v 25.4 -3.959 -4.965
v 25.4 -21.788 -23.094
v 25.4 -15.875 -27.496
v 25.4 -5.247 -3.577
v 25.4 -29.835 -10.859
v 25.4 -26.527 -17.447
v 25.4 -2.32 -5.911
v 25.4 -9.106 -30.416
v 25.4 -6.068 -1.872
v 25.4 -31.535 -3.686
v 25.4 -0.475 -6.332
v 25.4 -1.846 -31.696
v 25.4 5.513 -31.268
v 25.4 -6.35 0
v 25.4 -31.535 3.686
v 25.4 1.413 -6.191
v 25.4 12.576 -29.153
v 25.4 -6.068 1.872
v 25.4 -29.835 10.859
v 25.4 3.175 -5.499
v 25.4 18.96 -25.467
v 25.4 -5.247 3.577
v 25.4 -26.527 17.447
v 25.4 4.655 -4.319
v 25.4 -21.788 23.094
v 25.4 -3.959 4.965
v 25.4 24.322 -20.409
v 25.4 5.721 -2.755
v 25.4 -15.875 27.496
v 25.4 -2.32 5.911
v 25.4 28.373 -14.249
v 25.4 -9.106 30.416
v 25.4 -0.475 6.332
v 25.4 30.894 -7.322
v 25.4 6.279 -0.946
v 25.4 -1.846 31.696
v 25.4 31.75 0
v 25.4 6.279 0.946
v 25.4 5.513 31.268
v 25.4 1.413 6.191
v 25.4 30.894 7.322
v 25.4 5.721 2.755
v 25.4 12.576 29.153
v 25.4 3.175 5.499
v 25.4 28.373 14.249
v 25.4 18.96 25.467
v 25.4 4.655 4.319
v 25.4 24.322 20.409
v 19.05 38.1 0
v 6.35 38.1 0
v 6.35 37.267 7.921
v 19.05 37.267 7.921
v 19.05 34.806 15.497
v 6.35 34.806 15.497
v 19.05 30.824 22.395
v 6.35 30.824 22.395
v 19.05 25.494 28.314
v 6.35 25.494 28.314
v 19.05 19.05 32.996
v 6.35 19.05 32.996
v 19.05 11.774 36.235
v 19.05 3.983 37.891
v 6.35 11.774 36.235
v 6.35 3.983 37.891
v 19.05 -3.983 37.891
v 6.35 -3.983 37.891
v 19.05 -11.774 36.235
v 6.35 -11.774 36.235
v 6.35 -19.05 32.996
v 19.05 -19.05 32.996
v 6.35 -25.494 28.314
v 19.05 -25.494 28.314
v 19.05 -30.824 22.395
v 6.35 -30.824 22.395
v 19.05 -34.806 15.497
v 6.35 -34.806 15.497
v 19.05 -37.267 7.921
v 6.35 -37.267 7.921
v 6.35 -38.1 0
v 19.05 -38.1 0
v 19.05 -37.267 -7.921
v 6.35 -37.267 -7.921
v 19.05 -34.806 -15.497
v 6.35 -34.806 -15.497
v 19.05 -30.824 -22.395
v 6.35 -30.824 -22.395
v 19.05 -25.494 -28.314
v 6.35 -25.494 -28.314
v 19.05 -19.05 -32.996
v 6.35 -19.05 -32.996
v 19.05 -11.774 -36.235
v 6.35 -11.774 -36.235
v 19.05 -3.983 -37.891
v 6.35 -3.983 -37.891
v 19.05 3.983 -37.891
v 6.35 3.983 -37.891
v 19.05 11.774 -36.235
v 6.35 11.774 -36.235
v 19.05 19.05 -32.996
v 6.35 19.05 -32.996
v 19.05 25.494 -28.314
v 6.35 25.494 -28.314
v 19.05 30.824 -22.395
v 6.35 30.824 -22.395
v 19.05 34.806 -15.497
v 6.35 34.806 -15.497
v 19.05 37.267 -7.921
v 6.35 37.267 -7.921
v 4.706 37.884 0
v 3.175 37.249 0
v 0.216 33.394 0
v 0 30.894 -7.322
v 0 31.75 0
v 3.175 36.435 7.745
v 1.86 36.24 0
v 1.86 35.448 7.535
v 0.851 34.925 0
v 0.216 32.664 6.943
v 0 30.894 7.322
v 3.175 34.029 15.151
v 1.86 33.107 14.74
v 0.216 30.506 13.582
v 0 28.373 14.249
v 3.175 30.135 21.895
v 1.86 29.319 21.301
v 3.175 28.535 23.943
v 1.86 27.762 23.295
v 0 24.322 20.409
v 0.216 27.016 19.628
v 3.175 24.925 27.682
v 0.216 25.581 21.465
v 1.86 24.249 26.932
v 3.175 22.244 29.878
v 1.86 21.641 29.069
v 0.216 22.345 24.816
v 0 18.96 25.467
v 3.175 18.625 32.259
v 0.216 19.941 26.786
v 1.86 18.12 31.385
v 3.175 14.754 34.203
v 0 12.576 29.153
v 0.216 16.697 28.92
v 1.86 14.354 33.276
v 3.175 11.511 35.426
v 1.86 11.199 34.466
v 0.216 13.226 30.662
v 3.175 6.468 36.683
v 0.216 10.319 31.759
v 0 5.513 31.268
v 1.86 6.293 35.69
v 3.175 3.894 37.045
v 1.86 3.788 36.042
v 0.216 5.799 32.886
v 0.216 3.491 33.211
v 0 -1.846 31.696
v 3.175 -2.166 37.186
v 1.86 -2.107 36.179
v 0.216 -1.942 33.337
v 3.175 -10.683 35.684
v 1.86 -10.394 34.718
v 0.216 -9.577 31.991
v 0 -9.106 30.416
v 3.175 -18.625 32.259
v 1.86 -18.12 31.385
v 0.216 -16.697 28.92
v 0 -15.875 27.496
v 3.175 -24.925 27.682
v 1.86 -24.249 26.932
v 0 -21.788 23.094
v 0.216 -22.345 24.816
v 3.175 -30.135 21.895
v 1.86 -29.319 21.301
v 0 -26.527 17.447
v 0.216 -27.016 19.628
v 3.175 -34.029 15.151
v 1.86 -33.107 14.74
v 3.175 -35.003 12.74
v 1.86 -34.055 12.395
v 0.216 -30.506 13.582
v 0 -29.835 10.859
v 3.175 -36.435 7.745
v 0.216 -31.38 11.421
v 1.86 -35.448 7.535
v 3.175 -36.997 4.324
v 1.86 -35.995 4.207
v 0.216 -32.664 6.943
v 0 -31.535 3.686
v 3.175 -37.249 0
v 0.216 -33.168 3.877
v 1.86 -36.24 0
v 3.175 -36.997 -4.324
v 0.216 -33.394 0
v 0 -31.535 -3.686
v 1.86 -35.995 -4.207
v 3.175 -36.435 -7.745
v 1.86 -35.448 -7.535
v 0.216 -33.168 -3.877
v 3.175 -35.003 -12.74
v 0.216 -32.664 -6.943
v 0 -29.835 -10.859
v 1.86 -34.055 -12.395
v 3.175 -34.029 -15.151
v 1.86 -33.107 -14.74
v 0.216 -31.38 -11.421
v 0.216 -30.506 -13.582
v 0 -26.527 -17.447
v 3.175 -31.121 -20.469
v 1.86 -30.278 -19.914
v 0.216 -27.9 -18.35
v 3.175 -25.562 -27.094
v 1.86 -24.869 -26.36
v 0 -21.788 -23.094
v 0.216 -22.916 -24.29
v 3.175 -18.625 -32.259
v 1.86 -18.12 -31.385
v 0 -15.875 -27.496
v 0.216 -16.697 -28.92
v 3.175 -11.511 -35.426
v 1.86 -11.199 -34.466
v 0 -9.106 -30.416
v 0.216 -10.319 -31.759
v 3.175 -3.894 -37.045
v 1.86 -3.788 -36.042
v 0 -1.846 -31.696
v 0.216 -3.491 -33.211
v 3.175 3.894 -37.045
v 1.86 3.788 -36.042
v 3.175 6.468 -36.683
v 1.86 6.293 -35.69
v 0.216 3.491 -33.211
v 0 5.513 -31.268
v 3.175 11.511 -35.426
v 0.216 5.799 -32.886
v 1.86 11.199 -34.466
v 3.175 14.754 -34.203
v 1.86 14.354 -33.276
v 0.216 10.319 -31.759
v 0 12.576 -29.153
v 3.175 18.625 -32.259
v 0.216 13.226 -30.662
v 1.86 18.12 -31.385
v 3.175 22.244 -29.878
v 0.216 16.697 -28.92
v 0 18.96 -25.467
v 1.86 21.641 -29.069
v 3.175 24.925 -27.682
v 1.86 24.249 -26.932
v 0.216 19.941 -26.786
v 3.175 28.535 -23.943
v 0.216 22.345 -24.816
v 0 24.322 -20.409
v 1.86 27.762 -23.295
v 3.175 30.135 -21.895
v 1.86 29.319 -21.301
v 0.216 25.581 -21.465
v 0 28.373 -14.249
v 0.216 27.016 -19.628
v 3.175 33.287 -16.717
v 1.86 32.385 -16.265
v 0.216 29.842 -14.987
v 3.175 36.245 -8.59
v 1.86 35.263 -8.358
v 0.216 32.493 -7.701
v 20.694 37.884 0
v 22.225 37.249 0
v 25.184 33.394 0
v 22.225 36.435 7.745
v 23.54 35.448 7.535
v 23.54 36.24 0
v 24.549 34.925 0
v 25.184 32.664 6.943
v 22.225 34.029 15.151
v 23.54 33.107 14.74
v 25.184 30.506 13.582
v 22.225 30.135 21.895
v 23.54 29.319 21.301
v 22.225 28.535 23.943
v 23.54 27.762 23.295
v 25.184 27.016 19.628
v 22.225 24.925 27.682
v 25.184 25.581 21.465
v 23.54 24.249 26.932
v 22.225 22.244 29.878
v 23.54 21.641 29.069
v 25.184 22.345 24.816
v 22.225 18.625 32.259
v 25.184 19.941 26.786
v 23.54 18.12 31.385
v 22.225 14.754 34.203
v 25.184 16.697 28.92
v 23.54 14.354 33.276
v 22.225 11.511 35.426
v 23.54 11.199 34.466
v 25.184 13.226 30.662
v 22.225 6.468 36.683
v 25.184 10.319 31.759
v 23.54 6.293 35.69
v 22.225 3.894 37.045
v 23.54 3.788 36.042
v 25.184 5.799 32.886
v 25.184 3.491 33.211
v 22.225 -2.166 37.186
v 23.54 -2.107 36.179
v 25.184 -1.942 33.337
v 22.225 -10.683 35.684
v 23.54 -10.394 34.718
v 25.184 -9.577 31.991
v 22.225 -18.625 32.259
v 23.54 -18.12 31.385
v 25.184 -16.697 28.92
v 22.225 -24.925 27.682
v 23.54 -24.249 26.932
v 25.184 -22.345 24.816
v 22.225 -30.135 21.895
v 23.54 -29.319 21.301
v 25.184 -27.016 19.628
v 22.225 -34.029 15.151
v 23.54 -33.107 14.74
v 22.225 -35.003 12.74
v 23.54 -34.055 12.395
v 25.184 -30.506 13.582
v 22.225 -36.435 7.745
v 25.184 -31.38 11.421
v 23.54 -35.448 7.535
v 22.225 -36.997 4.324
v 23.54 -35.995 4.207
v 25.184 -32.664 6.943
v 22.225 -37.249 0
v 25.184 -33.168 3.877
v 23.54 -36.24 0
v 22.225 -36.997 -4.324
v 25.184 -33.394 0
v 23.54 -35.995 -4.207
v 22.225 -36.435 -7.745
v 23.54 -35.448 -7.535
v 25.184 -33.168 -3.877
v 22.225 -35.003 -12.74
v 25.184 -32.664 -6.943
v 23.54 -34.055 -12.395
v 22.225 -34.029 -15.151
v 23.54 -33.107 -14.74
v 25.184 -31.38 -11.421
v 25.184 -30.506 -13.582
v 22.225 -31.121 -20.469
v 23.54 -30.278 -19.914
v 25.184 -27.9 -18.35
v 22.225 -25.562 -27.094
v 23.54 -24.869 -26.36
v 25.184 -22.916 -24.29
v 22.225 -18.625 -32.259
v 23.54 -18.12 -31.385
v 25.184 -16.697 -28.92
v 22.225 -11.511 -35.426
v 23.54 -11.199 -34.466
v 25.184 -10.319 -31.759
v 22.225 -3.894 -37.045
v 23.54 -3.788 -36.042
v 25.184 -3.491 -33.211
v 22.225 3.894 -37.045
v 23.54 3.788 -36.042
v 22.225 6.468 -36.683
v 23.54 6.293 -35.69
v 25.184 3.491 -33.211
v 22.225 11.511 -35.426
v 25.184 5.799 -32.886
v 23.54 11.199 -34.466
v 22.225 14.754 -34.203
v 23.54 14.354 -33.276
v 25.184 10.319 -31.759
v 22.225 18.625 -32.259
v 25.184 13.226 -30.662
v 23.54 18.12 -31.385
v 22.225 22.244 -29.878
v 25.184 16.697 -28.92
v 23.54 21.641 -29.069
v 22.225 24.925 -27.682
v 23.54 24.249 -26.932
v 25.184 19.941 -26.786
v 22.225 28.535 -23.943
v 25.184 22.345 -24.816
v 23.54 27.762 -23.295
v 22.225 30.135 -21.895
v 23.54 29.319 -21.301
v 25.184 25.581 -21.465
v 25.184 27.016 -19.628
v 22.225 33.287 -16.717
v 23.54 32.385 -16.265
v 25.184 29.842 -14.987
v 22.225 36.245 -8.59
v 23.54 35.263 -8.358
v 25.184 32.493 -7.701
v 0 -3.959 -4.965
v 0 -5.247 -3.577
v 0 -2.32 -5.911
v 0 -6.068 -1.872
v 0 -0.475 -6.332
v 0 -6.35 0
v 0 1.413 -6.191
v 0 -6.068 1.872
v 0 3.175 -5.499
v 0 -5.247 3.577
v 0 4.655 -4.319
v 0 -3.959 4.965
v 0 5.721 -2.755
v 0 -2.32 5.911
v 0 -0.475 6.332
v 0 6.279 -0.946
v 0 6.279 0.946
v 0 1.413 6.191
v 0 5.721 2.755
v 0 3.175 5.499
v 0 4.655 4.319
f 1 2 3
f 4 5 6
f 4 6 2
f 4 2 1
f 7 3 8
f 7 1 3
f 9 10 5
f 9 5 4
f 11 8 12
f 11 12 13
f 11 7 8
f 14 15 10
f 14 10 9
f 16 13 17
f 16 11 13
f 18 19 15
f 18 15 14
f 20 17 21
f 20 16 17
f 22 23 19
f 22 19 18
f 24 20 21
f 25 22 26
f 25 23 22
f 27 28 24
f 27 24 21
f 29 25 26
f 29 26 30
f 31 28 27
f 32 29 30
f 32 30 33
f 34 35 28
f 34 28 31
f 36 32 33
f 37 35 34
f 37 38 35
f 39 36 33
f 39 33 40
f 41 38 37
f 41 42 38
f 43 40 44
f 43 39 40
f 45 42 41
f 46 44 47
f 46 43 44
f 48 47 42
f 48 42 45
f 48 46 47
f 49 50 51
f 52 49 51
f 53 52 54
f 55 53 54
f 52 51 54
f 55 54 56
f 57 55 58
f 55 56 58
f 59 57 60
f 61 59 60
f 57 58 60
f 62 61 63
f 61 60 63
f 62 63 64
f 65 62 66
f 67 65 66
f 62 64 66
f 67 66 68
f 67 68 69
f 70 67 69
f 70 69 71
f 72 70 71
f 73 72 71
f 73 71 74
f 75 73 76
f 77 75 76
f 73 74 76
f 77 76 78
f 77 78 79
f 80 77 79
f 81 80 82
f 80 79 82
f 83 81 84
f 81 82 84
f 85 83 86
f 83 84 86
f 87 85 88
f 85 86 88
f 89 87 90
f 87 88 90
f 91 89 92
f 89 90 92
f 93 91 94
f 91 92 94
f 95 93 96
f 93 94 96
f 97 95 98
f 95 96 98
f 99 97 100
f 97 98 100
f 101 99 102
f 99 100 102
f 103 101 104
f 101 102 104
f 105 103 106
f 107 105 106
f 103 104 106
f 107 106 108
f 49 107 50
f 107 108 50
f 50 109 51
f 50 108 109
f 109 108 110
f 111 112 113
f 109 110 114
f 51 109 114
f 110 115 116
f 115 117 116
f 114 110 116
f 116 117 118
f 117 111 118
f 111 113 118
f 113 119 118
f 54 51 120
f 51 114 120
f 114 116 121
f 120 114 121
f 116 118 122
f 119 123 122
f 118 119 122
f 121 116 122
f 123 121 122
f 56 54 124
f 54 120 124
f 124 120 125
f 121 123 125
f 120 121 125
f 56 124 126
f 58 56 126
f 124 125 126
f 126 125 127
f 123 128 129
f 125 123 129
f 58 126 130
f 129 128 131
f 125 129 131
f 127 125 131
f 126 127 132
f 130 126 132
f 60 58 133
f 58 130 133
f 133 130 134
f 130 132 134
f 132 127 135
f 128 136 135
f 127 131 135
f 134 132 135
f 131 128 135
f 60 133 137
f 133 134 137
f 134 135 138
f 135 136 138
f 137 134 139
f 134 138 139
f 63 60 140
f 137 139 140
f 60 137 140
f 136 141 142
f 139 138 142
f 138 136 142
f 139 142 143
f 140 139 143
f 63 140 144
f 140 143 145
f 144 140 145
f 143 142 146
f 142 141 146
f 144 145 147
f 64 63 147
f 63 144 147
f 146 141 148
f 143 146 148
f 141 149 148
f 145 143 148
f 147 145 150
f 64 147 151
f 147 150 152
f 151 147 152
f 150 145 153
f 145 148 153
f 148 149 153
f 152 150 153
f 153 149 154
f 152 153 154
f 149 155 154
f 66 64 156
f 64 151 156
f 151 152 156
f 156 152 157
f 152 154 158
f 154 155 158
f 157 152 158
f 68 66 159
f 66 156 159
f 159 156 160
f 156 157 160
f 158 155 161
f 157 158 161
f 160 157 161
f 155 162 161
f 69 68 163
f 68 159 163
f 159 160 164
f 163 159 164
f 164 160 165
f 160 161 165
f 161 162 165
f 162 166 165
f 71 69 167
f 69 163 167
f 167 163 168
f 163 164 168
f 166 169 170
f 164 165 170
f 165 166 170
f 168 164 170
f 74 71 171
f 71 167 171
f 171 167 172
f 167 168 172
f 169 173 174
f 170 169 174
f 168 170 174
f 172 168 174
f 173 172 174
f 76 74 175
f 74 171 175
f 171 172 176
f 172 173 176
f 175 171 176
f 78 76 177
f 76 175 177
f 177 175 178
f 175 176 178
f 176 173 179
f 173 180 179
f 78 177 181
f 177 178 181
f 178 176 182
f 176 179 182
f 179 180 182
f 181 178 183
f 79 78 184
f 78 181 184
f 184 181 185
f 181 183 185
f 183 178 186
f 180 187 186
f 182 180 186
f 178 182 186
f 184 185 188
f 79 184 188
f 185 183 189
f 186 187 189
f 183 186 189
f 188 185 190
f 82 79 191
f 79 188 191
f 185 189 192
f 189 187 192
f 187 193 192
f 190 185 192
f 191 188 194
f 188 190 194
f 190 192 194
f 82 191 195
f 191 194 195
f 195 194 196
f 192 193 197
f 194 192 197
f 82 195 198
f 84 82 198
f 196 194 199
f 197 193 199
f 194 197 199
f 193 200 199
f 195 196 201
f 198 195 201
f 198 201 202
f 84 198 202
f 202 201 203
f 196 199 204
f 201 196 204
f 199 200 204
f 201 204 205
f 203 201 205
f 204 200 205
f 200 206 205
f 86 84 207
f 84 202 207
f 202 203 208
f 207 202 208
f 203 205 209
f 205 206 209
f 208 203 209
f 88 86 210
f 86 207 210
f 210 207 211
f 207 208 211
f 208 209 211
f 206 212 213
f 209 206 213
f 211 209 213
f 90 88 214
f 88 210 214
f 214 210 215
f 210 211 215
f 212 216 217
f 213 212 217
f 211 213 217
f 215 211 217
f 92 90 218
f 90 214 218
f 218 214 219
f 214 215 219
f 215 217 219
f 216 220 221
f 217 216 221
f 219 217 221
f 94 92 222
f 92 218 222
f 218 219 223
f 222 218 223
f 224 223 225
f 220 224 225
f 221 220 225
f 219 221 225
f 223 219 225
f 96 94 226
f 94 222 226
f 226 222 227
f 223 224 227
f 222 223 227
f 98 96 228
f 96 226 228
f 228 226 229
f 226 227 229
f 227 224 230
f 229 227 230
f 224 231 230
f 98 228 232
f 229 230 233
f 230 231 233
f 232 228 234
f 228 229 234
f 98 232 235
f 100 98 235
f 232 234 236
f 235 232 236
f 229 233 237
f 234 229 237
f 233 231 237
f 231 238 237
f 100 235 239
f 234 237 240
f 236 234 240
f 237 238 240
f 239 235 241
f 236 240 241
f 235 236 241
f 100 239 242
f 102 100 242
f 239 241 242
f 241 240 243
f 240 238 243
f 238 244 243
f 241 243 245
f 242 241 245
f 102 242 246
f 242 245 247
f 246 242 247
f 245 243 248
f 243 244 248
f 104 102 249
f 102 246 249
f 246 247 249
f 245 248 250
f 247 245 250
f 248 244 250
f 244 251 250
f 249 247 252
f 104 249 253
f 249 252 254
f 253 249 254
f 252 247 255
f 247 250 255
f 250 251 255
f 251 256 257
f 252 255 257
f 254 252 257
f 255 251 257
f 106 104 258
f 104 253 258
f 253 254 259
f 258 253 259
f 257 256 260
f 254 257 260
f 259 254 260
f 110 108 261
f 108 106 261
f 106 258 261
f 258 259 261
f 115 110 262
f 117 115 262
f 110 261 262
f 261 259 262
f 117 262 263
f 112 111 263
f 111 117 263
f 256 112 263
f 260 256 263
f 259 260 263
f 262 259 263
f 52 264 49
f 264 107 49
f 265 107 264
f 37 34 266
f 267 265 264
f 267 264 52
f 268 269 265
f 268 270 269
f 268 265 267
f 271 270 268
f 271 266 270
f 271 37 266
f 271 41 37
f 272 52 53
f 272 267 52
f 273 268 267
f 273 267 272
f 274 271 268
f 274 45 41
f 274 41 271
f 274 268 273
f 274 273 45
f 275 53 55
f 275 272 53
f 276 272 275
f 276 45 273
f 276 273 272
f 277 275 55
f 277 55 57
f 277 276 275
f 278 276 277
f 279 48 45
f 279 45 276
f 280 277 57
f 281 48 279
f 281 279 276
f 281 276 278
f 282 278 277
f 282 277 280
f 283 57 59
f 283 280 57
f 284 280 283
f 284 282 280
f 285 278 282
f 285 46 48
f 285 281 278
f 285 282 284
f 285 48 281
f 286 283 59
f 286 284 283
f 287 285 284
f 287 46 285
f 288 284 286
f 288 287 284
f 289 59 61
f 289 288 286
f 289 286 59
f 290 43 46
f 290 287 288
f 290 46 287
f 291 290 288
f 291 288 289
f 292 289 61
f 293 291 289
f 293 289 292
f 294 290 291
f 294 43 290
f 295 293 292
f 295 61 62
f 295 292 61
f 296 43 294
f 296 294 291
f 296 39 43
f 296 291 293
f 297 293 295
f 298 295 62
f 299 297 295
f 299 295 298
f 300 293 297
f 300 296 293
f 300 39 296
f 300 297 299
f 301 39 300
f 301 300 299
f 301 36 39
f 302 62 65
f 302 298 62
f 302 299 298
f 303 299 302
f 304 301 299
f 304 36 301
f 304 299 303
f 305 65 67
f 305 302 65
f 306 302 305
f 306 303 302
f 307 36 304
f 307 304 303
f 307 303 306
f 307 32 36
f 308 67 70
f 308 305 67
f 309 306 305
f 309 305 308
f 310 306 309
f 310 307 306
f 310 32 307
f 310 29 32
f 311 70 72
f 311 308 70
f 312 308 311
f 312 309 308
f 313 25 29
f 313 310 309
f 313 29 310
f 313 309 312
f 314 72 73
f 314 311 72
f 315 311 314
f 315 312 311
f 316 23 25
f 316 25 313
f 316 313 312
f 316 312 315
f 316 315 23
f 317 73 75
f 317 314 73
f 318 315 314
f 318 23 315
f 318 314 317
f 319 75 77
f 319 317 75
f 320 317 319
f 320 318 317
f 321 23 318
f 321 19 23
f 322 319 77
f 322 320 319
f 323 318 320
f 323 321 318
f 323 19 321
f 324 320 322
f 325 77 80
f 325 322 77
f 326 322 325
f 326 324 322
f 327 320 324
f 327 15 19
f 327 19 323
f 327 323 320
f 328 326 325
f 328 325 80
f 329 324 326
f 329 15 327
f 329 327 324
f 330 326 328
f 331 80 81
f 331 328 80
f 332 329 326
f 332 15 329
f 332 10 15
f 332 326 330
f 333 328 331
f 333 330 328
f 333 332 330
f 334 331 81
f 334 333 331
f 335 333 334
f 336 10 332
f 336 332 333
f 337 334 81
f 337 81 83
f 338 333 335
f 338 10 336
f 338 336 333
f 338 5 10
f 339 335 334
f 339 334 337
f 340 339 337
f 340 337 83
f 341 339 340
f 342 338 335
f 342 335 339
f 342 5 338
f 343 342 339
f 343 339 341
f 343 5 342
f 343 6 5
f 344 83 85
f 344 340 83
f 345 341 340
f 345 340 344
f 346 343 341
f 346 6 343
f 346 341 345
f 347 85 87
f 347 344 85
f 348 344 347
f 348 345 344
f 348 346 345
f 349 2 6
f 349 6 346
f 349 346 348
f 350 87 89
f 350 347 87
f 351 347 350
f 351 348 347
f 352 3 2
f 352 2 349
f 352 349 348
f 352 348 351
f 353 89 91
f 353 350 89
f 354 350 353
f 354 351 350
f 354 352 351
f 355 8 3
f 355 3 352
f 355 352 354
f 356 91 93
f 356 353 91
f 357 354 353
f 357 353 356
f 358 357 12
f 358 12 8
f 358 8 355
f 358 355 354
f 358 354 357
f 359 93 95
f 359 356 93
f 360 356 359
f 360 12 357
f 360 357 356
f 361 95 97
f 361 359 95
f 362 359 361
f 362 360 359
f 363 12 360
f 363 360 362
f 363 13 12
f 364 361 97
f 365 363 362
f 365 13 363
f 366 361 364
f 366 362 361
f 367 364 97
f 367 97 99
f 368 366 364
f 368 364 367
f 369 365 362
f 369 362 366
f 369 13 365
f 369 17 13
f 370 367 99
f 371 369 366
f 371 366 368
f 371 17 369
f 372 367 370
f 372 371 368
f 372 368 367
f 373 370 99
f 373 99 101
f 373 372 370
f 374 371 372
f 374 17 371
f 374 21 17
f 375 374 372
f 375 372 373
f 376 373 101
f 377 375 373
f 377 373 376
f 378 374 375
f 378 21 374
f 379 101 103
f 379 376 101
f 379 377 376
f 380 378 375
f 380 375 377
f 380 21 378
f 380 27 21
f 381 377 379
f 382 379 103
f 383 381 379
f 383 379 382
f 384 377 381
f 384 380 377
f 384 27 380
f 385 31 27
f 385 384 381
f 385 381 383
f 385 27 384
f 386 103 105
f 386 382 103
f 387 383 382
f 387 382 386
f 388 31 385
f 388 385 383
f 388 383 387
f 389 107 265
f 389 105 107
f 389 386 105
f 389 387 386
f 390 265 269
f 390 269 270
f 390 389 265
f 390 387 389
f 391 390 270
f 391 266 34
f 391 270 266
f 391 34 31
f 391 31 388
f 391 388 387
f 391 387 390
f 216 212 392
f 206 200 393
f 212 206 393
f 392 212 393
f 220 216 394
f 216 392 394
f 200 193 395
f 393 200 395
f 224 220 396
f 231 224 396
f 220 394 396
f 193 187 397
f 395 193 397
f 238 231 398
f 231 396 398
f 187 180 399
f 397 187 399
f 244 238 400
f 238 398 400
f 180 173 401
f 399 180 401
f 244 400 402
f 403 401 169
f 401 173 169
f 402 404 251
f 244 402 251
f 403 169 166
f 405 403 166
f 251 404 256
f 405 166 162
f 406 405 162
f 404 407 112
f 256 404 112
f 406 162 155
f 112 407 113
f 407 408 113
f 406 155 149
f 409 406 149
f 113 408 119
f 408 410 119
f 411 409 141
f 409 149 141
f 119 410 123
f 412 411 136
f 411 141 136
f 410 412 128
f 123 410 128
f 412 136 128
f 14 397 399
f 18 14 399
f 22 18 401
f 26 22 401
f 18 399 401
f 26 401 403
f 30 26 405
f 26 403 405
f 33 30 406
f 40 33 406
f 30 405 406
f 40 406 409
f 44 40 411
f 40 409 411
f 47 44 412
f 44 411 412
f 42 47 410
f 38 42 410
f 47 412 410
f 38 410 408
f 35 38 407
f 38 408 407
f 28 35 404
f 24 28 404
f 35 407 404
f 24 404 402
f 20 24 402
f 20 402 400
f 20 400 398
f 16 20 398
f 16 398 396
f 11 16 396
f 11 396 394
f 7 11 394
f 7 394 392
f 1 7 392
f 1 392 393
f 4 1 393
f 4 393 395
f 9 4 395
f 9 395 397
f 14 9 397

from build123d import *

# Parameters (mm, degrees)
F0_R     = 38.1
F1_DEPTH = 25.4
F3_D     = 12.7
F4_R     = 6.35
F5_R     = 6.35


with BuildPart() as f1:
    # F0 (on Right) → F1 (new body)
    with BuildSketch(Plane.YZ):
        Circle(F0_R)
    extrude(amount=F1_DEPTH)

    # F3 (through all)
    with Locations(Plane.YZ.offset(25.4)):
        with Locations((0, 0)):
            Hole(F3_D / 2)

    # F4
    f4_edges = [f1.edges().sort_by_distance(p)[0] for p in [
        (25.4, -38.1, 0),
    ]]
    fillet(f4_edges, radius=F4_R)

    # F5
    f5_edges = [f1.edges().sort_by_distance(p)[0] for p in [
        (0, -38.1, 0),
    ]]
    fillet(f5_edges, radius=F5_R)


solid = f1.part
